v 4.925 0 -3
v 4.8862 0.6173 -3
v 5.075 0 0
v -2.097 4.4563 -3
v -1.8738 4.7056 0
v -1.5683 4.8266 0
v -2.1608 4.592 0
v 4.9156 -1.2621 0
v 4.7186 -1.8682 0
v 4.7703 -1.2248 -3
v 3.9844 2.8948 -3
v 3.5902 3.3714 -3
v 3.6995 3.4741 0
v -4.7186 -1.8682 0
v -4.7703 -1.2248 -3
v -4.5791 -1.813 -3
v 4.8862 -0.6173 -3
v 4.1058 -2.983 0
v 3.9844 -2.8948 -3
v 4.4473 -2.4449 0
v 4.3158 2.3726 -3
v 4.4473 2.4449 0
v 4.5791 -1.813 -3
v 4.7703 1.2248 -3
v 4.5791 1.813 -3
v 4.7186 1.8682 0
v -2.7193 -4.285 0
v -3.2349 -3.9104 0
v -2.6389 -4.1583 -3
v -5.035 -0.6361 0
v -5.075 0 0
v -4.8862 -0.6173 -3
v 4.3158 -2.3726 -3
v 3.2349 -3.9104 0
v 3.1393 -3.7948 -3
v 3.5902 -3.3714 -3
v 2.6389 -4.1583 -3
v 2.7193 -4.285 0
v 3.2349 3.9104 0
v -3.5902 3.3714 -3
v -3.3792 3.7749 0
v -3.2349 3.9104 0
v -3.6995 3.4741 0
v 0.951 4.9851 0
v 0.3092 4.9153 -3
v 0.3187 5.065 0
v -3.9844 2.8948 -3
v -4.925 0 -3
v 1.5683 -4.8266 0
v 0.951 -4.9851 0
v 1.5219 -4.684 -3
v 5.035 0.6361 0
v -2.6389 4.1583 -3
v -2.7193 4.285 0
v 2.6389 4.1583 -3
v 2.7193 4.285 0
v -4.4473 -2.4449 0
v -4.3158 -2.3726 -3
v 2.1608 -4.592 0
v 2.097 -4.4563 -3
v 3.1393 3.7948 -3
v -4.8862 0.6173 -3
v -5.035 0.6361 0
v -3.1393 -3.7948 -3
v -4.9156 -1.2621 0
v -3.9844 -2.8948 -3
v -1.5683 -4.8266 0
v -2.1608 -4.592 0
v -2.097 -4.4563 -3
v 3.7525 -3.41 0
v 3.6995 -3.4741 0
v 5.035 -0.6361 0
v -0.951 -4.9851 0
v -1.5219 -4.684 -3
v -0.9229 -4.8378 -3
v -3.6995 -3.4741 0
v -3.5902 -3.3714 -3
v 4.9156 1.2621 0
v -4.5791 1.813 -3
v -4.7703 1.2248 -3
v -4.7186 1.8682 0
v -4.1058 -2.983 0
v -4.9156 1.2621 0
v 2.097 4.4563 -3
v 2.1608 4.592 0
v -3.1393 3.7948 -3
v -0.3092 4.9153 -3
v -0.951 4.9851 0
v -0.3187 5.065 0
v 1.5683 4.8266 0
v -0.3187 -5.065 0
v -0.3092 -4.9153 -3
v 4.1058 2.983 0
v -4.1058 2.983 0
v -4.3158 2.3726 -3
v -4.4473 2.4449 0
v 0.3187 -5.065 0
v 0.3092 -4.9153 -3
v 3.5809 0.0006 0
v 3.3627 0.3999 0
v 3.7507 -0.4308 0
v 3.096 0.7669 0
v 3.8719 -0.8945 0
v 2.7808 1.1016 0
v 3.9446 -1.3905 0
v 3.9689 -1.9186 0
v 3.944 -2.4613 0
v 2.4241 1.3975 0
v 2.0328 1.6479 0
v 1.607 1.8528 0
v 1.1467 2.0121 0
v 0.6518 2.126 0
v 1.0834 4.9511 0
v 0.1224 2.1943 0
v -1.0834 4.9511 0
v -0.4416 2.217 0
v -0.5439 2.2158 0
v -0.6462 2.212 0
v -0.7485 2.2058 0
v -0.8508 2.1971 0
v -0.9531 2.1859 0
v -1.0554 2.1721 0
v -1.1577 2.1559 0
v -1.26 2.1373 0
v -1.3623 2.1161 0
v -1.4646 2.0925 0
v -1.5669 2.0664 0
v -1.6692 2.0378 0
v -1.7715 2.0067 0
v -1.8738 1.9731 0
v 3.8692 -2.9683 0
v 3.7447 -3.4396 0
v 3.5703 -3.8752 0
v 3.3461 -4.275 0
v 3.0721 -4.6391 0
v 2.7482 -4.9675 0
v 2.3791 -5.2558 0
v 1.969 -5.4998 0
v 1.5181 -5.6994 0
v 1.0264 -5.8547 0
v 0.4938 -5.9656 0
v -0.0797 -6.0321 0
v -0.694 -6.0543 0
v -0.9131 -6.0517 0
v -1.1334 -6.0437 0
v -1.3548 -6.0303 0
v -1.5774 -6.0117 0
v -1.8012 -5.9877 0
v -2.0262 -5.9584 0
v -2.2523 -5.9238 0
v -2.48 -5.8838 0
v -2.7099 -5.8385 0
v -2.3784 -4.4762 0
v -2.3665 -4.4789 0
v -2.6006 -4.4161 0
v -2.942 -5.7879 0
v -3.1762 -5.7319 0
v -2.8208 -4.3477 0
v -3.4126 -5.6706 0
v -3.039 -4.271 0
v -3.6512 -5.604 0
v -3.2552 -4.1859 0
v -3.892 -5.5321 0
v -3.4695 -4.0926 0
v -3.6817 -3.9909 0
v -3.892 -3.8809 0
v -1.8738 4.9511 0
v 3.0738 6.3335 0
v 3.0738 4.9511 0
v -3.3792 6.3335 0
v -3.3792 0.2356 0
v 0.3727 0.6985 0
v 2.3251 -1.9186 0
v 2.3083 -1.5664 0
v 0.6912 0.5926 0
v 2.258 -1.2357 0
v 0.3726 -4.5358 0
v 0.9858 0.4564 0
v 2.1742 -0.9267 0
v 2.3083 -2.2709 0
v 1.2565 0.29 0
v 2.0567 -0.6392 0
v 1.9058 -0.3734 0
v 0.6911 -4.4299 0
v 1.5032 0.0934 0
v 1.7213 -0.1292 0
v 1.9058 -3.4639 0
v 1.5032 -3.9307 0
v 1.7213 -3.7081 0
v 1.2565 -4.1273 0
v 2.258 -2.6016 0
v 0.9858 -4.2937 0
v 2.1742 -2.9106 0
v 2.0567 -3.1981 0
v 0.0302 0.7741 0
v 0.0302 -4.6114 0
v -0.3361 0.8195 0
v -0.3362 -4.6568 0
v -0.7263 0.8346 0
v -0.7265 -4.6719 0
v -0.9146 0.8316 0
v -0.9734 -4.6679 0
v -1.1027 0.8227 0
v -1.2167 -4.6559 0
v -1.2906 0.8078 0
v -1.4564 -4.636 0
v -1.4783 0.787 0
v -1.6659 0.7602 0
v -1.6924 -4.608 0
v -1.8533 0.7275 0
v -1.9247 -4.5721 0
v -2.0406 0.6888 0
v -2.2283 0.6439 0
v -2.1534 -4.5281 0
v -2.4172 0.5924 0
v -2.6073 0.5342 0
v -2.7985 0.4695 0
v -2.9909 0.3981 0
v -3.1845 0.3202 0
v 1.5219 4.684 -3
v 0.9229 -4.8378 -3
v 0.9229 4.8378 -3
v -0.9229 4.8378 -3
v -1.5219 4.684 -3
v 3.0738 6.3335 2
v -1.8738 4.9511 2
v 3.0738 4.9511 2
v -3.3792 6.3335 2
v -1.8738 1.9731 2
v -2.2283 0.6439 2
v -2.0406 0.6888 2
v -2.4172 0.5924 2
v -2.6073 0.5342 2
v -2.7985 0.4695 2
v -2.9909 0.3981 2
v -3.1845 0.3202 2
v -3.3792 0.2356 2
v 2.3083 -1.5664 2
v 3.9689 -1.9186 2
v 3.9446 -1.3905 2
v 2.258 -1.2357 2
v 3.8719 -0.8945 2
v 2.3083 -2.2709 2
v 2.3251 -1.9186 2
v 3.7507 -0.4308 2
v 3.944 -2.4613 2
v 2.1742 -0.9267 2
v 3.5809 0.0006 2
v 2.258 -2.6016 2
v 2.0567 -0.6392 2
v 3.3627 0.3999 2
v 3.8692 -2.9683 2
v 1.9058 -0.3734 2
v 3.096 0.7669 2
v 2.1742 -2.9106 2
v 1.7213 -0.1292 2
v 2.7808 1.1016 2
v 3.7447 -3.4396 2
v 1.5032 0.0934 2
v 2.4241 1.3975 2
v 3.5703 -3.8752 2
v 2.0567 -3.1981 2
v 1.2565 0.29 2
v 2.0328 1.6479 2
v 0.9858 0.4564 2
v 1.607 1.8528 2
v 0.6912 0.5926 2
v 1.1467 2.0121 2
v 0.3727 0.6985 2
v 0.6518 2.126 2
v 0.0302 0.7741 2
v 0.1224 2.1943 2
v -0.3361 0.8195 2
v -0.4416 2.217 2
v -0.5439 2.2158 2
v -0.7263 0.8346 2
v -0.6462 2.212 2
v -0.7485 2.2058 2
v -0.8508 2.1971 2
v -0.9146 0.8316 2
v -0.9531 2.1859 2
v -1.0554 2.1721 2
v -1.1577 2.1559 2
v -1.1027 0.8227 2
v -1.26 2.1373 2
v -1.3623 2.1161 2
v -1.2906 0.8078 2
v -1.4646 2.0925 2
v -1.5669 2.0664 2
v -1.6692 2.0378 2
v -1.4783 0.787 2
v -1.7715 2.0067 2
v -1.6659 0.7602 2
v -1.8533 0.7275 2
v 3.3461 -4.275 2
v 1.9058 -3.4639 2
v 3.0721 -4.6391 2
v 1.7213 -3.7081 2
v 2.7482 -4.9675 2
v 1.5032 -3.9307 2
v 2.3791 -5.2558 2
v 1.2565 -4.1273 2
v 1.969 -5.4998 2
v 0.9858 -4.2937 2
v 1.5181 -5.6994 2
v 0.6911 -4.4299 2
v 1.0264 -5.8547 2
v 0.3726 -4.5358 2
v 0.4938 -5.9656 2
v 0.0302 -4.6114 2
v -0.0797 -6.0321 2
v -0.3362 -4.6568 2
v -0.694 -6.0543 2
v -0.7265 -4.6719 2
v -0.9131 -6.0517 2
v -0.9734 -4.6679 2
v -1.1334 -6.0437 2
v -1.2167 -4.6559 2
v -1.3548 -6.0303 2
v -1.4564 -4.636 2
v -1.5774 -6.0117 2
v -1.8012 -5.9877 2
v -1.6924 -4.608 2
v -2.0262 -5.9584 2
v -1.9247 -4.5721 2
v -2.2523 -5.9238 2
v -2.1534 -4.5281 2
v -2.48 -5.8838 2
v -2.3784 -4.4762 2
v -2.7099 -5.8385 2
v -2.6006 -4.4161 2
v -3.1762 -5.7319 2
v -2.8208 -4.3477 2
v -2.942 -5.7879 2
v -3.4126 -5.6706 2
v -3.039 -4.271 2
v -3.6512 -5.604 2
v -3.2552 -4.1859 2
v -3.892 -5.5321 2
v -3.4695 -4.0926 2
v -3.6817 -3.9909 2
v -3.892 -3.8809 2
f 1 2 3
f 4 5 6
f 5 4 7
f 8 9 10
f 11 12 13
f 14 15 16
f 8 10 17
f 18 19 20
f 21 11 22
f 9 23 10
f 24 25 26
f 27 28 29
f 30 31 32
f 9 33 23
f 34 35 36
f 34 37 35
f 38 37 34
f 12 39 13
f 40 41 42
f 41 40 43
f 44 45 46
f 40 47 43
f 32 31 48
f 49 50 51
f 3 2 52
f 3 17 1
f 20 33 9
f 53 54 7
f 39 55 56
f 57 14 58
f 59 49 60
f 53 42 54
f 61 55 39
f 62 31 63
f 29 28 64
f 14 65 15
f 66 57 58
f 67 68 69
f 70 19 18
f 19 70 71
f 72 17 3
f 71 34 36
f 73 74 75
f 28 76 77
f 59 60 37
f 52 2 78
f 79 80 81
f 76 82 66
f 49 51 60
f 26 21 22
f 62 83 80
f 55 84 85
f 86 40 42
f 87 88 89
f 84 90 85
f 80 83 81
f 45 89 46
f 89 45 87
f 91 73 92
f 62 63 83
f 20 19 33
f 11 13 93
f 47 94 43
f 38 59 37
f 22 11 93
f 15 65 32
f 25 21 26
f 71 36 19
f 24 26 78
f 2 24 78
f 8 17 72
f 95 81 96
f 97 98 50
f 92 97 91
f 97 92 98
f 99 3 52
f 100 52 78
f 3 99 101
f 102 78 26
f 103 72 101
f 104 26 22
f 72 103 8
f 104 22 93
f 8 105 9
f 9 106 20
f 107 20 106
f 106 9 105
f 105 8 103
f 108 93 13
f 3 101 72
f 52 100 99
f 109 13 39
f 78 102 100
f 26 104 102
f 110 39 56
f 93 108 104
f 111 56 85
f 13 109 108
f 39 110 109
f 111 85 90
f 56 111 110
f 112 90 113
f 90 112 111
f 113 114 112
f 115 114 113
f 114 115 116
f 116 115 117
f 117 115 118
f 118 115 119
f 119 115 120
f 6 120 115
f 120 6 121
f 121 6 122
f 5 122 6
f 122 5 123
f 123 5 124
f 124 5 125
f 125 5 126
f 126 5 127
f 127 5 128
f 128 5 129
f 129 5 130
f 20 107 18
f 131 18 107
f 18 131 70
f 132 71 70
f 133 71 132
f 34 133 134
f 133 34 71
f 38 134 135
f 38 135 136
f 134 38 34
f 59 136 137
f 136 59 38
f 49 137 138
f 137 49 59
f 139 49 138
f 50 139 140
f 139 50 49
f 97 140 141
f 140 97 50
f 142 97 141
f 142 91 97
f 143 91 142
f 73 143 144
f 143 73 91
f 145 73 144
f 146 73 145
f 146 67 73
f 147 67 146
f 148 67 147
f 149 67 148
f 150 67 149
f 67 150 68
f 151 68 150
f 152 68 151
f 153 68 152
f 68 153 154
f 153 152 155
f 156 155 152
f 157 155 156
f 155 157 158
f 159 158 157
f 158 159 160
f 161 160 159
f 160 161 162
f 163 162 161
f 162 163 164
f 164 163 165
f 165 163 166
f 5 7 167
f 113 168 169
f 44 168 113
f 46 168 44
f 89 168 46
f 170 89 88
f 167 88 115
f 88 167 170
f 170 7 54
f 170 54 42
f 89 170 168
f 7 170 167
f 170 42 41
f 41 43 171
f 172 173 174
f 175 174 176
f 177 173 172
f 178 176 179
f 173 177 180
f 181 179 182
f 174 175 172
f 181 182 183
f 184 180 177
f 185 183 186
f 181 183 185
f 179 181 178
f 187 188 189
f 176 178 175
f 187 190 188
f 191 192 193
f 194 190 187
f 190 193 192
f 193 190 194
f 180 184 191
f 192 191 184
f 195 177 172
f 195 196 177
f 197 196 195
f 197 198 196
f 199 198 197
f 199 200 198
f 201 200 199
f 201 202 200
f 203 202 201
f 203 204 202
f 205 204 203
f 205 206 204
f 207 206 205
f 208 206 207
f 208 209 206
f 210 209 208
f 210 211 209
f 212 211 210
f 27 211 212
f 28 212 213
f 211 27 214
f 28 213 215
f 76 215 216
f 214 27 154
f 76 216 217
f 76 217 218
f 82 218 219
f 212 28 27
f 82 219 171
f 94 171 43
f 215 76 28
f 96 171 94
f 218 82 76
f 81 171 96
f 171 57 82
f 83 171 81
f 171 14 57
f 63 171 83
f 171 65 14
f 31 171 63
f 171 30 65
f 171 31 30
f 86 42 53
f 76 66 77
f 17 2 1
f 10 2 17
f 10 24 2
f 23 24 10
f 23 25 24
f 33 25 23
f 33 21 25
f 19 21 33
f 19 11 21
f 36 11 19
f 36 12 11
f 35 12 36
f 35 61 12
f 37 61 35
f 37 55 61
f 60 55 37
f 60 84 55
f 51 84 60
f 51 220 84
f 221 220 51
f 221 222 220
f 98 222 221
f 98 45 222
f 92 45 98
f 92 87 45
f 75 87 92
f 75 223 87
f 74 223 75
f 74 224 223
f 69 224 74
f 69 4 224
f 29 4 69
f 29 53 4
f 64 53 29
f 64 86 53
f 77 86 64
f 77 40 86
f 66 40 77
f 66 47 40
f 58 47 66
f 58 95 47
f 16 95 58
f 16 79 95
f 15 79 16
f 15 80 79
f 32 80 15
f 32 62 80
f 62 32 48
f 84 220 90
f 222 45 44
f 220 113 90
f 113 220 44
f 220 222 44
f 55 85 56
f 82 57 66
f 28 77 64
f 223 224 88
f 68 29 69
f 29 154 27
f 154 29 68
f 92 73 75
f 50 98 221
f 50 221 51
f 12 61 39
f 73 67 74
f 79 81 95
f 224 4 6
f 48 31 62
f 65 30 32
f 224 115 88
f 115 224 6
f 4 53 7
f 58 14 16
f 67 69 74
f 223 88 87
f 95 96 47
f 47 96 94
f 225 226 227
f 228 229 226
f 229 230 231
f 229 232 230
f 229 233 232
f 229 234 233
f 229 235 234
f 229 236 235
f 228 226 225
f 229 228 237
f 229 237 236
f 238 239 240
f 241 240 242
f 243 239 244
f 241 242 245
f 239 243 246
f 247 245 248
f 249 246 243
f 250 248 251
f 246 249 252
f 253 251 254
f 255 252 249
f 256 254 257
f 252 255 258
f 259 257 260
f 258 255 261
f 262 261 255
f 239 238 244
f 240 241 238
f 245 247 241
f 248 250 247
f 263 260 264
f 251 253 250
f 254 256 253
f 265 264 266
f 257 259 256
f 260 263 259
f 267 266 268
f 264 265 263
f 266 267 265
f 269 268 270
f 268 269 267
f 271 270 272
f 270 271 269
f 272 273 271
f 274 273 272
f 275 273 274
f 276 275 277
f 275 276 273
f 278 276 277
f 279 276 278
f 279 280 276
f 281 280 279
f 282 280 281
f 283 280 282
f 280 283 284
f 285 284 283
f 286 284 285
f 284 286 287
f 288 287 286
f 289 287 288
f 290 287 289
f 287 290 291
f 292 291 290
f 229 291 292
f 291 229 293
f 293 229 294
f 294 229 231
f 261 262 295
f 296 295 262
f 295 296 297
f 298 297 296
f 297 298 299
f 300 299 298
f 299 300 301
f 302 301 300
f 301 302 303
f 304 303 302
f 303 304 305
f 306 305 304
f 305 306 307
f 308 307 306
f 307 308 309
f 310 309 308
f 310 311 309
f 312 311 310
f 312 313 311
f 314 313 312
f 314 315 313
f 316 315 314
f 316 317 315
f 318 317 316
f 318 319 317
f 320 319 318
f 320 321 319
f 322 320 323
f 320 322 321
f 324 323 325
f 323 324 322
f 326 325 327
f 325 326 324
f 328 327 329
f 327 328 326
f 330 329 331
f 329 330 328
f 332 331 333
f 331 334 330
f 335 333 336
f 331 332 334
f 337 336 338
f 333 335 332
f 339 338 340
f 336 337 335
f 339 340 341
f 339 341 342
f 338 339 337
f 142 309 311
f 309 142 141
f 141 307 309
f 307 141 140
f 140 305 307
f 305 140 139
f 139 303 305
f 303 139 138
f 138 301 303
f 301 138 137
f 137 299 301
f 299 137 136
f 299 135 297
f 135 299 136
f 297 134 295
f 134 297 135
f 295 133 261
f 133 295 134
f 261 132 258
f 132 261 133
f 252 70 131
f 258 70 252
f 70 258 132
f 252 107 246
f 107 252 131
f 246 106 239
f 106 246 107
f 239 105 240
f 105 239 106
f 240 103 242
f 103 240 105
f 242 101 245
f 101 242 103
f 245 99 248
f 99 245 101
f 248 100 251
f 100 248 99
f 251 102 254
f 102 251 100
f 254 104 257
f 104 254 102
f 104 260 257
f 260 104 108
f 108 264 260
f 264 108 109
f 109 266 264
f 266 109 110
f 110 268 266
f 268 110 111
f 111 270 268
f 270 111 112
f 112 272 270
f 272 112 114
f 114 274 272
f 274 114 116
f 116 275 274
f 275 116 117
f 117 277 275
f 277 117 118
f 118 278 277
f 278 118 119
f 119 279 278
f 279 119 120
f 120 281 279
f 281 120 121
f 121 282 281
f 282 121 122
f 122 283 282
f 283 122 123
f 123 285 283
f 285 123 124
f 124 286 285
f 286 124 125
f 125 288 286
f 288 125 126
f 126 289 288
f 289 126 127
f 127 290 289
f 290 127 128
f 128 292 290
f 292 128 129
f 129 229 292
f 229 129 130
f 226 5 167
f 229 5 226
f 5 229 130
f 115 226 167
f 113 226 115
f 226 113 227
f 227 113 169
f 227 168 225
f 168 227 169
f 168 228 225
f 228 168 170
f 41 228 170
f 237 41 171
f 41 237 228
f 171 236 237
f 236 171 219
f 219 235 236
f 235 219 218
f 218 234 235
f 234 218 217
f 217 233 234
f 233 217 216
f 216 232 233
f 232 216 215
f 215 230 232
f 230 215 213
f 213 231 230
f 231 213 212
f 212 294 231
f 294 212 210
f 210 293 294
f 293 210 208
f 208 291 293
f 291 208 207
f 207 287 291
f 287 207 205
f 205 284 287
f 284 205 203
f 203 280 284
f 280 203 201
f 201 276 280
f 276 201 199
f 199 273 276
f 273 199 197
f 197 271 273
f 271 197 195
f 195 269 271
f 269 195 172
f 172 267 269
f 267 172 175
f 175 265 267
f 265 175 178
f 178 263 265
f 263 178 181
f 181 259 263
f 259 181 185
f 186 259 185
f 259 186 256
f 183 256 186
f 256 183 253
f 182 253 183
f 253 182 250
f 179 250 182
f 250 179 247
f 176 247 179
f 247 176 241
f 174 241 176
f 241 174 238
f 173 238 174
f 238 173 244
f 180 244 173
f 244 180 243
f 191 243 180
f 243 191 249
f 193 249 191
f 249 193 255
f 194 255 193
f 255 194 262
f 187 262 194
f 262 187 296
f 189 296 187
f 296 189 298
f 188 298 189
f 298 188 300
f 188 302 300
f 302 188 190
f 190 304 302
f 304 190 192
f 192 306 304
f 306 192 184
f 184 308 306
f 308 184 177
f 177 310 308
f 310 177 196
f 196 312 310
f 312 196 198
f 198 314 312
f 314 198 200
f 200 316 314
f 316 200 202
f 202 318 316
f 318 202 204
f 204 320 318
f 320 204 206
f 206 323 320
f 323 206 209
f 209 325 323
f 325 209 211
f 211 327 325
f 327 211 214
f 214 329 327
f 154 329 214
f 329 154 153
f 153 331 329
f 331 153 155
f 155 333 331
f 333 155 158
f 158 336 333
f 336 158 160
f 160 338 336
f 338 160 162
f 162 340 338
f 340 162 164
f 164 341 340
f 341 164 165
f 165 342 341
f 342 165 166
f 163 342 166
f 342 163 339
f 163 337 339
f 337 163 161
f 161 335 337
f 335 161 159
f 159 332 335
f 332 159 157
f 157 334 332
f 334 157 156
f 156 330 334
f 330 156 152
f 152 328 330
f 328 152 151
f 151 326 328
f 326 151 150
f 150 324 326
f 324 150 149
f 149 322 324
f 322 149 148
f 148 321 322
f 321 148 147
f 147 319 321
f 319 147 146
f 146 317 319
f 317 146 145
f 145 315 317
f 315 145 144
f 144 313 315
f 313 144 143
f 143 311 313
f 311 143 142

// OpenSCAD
$fn = 50;


difference() {
	union() {
		translate(v = [0, 0, -3.0000000000]) {
			cylinder(h = 3, r1 = 4.9250000000, r2 = 5.0750000000);
		}
		linear_extrude(height = 2) {
			text(font = "Impact", halign = "center", size = 12, text = "5", valign = "center");
		}
	}
	union();
}
